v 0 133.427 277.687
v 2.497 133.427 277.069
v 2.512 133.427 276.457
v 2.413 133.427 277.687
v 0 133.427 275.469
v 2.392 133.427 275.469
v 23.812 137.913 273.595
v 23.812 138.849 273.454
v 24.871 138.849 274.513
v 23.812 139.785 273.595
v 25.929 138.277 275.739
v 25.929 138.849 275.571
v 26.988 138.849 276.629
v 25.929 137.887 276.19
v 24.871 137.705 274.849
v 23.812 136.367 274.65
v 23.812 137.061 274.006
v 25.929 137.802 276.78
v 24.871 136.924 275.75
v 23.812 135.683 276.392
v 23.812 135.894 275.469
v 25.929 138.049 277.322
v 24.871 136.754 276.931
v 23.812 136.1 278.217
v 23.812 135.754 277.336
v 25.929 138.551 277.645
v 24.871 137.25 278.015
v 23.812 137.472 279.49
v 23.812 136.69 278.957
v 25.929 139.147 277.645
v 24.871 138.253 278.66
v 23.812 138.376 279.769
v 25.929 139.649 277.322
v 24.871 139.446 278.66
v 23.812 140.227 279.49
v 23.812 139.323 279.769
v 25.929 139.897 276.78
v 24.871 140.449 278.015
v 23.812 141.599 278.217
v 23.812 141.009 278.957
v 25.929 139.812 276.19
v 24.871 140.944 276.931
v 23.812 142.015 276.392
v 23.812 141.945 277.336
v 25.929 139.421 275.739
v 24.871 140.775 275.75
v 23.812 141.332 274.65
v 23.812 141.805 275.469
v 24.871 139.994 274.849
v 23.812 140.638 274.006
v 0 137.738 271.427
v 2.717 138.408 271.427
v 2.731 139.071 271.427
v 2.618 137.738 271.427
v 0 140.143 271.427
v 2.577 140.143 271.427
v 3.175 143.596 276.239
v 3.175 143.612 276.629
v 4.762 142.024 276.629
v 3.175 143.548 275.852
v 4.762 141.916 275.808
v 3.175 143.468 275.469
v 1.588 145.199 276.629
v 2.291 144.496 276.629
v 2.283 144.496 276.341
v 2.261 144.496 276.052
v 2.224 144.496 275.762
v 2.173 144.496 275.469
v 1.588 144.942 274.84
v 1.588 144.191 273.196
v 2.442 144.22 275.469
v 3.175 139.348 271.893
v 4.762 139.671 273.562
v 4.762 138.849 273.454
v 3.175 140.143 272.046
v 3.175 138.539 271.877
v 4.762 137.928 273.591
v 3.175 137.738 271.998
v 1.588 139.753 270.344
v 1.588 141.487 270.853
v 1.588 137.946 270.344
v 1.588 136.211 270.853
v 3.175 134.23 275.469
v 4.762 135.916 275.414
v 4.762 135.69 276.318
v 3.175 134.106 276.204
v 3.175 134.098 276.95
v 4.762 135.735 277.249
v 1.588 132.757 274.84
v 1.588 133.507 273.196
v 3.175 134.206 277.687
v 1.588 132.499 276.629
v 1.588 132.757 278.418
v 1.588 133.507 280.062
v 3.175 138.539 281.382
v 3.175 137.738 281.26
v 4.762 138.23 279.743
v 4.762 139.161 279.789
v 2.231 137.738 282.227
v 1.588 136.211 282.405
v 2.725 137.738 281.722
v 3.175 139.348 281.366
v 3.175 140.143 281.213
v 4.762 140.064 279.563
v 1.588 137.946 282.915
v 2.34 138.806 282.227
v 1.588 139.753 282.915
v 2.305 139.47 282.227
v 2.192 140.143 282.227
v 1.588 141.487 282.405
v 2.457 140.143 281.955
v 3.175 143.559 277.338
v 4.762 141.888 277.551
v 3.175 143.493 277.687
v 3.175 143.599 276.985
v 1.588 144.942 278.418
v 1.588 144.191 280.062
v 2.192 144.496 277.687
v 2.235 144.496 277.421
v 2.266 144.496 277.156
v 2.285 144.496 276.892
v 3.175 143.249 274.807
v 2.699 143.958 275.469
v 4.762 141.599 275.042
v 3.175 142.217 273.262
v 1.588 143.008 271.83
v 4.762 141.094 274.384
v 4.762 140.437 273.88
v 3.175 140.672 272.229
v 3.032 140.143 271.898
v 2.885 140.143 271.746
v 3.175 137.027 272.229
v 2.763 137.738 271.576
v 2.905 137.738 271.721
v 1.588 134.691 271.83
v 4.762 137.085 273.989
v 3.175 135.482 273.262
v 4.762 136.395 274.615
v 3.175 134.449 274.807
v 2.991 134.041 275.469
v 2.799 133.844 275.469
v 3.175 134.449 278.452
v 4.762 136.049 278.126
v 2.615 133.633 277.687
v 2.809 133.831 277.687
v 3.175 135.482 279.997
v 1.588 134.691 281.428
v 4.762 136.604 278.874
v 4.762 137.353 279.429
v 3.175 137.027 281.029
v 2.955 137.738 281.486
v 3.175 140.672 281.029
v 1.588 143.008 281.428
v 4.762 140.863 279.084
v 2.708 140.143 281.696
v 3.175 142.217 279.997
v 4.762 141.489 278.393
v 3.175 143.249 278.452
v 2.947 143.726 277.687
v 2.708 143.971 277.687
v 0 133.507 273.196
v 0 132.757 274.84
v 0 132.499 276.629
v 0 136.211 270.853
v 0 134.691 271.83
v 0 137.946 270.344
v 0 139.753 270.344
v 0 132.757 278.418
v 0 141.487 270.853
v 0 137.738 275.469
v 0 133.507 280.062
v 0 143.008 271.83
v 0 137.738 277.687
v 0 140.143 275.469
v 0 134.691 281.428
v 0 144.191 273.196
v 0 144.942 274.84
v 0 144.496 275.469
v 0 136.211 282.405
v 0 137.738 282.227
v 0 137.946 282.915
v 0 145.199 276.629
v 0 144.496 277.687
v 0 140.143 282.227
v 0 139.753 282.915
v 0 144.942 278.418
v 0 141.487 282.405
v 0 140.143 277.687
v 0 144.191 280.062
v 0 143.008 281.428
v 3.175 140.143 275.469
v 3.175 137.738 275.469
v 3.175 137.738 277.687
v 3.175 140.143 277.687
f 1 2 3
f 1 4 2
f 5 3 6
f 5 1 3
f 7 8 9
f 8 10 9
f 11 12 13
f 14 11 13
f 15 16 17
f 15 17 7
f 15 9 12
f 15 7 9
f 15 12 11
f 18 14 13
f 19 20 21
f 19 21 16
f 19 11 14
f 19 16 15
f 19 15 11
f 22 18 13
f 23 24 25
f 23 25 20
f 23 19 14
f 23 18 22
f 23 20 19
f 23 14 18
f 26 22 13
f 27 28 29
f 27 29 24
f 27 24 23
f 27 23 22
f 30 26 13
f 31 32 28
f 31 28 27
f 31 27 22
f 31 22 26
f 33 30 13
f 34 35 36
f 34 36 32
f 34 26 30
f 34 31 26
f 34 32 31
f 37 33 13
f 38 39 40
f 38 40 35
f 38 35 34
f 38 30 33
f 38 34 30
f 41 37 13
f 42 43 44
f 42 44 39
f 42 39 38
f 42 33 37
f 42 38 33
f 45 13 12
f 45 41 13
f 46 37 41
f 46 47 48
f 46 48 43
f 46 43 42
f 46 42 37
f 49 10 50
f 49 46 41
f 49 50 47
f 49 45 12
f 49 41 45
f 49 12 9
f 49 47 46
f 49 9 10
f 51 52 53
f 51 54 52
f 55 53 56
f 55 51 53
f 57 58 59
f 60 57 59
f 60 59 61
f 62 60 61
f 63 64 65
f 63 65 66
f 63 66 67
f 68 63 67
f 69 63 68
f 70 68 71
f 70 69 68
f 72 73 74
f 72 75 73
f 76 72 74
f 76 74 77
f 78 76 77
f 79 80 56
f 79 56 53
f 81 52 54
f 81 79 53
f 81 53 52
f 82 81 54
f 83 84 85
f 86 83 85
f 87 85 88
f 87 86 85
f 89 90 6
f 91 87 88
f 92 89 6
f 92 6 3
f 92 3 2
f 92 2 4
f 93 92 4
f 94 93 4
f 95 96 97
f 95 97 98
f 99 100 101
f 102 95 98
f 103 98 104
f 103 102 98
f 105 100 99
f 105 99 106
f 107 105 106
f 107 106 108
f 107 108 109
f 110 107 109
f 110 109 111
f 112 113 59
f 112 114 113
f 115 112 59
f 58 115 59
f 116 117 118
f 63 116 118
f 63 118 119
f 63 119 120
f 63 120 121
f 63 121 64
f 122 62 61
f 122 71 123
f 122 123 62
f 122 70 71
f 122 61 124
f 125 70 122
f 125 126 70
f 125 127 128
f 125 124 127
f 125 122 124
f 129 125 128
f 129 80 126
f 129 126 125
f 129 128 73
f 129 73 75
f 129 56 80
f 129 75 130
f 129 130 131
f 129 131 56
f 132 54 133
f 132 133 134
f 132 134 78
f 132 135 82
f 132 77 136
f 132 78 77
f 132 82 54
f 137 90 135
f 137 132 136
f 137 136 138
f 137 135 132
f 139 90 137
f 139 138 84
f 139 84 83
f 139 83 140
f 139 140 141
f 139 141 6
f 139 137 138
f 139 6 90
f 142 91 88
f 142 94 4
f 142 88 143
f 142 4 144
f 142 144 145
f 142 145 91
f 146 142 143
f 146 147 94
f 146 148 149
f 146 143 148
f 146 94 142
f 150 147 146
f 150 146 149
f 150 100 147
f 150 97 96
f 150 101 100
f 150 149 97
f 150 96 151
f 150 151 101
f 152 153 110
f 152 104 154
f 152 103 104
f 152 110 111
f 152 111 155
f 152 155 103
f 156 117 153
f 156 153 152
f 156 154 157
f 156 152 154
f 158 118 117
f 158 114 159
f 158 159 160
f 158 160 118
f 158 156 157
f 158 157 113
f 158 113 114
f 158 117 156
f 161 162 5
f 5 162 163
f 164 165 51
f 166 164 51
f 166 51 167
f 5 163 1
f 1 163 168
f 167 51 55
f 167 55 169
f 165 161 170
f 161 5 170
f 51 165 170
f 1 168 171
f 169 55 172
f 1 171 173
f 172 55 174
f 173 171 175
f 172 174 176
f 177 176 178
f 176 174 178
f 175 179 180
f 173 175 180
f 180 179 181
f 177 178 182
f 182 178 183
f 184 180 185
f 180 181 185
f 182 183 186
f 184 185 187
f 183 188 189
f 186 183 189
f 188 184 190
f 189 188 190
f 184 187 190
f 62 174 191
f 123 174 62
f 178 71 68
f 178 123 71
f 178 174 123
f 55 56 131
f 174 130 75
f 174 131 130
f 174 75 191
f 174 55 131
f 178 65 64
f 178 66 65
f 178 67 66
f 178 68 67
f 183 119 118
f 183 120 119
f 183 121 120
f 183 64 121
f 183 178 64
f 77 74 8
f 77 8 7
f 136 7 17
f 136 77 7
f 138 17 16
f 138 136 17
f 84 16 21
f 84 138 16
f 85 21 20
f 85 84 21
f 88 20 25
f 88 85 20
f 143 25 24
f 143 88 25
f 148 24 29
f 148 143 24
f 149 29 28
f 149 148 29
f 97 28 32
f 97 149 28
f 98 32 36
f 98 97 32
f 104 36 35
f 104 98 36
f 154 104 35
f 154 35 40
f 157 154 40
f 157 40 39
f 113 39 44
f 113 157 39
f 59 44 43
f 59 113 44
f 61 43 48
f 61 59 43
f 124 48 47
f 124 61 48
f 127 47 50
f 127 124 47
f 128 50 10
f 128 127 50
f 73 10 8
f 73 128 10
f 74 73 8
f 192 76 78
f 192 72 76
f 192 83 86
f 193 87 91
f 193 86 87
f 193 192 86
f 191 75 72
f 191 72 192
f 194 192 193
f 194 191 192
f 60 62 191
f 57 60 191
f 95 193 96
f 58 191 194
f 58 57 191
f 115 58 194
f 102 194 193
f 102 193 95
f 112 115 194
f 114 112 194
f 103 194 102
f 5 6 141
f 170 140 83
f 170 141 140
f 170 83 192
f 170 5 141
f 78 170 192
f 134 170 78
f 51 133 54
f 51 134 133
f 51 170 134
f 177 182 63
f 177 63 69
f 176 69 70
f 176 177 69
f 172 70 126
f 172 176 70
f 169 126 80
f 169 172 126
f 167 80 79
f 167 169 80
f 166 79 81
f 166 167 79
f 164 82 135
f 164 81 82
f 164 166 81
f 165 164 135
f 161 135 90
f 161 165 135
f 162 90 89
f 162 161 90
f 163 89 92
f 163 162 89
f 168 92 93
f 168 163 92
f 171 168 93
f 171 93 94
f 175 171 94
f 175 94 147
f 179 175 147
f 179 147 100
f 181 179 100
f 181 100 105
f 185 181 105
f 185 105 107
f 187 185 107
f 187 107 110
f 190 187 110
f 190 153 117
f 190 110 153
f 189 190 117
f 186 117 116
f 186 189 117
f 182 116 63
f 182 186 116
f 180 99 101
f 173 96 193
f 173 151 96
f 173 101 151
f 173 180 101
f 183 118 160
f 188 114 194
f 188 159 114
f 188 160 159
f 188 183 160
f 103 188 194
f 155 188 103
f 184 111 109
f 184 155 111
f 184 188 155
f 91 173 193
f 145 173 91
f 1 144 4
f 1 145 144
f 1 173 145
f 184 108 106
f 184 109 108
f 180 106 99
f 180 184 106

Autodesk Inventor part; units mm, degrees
ref_plane "YZ Plane" through (0, 0, 0) normal (1, 0, 0) x (0, 1, 0)
ref_plane "XZ Plane" through (0, 0, 0) normal (0, 1, 0) x (-1, 0, 0)
ref_plane "XY Plane" through (0, 0, 0) normal (0, 0, 1) x (1, 0, 0)
sketch "Sketch1" plane through (0, 0, 0) normal (1, 0, 0) x (0, 1, 0)
  circle A0 centre (169.2255, 363.3555) radius 48.0965
  circle A1 centre (138.8493, 276.6293) radius 6.35
  point P0 (0, 0)
  dimension "d0" = 12.7
extrude "Extrusion1" add sketch "Sketch1" along normal blind 4.7625 contours A1
chamfer "Chamfer1" distance 3.175 angle 45 1 edges at (4.7625, 132.4993, 276.6293)
sketch "Sketch2" plane through (4.7625, 138.8493, 276.6293) normal (1, 0, 0) x (0, 0, -1)
  circle A0 centre (0, 0) radius 3.175 projected
  circle A1 centre (0, 0) radius 3.175
  point P0 (276.6293, -138.8493)
extrude "Extrusion2" add sketch "Sketch2" along normal blind 22.225
chamfer "Chamfer2" distance 3.175 angle 45 1 edges at (26.9875, 138.8493, 279.8043)
sketch "Sketch3" plane through (0, 138.8493, 276.6293) normal (-1, 0, 0) x (0, 0, 1)
  point P0 (-276.6293, -138.8493)
thread "Thread1" size "1/4-20 UNC" class "2A" standard "ANSI Unified Screw Threads" full length
sketch "Sketch4" plane through (0, 138.8493, 276.6293) normal (-1, 0, 0) x (0, 0, 1)
  line L0 (-1.16, 5.6468) -> (1.058, 5.6468)
  line L1 (1.058, 5.6468) -> (1.058, -5.4225)
  line L2 (1.058, -5.4225) -> (-1.16, -5.4225)
  line L3 (-1.16, -5.4225) -> (-1.16, 5.6468)
  line L4 (-5.2022, 1.2937) -> (5.5977, 1.2937)
  line L5 (5.5977, 1.2937) -> (5.5977, -1.1109)
  line L6 (5.5977, -1.1109) -> (-5.2022, -1.1109)
  line L7 (-5.2022, -1.1109) -> (-5.2022, 1.2937)
  point P0 (-276.6293, -138.8493)
extrude "Extrusion3" cut sketch "Sketch4" against normal blind 3.175
properties part number "screw"
